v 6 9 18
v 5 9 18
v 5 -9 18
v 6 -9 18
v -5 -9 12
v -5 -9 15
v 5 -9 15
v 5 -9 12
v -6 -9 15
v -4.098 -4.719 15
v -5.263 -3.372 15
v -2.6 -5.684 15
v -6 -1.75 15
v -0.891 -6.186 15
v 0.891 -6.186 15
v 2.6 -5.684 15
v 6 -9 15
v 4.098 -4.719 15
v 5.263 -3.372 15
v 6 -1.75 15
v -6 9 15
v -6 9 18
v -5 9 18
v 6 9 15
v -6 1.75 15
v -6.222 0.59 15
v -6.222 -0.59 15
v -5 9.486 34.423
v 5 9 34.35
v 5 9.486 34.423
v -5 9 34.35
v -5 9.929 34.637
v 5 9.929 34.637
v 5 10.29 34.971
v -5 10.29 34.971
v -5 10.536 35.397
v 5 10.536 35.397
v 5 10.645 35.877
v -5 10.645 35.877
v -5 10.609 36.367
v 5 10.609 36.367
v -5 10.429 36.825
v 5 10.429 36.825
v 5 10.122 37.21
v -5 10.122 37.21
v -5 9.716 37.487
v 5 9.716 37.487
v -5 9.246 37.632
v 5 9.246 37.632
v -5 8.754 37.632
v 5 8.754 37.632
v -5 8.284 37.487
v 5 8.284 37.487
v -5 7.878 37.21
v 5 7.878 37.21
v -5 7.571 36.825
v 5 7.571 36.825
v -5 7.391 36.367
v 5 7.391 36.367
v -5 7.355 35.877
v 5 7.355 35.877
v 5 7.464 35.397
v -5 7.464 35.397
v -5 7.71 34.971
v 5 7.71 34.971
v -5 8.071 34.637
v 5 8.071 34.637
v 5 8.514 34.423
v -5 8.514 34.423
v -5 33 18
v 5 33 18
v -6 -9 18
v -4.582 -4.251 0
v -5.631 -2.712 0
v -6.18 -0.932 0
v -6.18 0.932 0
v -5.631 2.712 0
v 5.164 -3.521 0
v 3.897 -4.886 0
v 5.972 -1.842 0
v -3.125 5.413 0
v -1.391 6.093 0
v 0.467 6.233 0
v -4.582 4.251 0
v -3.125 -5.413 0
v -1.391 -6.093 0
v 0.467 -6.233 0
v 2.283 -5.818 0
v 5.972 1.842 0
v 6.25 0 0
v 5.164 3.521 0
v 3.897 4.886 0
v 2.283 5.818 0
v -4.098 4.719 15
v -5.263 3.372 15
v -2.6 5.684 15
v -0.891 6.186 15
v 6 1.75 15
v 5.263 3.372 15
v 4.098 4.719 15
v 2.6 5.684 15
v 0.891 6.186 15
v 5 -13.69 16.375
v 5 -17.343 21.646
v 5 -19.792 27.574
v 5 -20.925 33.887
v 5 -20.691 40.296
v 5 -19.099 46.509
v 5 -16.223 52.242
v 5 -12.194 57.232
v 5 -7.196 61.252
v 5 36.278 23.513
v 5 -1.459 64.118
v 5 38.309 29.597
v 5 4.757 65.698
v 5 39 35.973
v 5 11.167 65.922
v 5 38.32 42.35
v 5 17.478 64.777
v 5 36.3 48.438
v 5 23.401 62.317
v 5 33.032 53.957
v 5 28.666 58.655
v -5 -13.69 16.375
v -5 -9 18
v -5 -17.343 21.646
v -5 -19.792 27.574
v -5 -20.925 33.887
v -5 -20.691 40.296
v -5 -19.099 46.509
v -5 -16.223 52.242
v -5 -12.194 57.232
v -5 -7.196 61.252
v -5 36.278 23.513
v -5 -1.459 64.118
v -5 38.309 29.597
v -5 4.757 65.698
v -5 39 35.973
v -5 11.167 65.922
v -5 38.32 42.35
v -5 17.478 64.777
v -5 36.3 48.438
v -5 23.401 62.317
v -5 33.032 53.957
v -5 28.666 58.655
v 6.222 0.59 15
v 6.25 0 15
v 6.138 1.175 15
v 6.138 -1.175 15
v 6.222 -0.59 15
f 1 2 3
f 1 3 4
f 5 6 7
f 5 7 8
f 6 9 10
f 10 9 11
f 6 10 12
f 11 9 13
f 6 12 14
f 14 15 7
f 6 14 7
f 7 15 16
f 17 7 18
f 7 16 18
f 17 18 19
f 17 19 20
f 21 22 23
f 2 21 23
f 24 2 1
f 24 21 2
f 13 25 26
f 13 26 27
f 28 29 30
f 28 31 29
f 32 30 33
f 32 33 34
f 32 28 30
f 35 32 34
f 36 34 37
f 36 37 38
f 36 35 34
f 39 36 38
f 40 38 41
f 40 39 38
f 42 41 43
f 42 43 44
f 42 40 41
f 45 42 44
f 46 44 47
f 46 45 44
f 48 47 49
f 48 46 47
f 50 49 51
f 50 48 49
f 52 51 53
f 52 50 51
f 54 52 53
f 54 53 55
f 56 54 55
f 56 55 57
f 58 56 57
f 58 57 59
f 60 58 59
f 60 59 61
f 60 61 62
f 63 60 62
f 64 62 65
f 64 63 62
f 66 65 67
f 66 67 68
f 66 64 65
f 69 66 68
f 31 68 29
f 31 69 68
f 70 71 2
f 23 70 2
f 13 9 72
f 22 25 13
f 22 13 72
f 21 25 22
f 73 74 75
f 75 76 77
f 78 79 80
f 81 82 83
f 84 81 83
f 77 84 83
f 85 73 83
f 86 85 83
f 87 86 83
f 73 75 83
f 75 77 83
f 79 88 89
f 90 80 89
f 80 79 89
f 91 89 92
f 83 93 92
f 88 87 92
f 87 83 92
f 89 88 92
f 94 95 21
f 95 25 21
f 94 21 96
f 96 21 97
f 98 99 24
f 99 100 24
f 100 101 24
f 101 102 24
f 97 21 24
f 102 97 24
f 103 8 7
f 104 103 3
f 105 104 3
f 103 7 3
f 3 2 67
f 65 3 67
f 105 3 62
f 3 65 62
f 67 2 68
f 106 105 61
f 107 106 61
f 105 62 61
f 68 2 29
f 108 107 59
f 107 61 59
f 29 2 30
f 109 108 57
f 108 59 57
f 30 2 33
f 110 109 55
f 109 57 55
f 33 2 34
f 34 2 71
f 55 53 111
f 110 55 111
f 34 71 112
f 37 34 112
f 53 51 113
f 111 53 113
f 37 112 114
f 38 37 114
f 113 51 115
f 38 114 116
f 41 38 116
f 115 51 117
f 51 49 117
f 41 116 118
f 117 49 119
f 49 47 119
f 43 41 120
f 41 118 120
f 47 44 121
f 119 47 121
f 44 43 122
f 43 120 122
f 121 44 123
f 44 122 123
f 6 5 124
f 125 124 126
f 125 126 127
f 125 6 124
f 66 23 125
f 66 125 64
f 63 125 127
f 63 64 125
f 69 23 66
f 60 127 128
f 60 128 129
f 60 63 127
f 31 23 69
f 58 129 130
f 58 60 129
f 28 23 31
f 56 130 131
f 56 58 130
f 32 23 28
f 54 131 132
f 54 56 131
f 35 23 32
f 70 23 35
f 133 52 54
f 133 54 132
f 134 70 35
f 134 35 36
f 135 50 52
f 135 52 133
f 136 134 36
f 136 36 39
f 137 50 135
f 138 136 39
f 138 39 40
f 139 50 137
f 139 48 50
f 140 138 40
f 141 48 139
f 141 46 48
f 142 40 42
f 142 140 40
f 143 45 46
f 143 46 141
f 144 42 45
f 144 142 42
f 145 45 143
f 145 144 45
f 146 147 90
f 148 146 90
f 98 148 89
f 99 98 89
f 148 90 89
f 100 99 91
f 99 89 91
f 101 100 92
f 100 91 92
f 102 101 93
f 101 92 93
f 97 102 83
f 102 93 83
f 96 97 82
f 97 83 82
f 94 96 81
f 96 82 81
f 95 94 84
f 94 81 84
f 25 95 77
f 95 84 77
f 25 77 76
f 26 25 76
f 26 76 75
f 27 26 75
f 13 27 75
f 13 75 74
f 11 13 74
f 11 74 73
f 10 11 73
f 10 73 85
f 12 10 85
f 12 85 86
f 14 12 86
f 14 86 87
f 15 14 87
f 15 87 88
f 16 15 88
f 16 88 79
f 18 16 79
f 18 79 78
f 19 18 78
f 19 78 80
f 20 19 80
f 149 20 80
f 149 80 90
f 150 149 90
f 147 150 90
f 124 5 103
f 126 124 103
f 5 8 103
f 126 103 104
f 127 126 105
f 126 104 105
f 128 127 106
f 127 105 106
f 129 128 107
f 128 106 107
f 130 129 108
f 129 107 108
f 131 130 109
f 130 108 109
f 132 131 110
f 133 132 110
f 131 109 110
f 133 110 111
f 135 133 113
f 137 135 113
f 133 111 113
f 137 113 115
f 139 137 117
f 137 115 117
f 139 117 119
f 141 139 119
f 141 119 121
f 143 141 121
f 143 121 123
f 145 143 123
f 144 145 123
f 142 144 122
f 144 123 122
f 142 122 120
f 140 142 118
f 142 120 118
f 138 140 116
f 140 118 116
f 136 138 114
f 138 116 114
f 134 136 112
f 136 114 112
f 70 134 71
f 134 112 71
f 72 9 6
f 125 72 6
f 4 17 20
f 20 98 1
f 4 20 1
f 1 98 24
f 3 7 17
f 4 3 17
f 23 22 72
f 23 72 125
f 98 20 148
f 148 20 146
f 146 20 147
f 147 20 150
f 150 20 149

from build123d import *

# Parameters (mm, degrees)
SKETCH_2_R      = 6.25
EXTRUDE_1_DEPTH = 15
SKETCH_3_W      = 12
SKETCH_3_H      = 18
EXTRUDE_2_DEPTH = 3
SKETCH_4_R      = 1.65
EXTRUDE_3_DEPTH = 5


with BuildPart() as part:
    # ｽｹｯﾁ2 → ﾎﾞｽ - 押し出し1 (new body)
    with BuildSketch(Plane.XY):
        Circle(SKETCH_2_R)
    extrude(amount=EXTRUDE_1_DEPTH)

    # ｽｹｯﾁ3 → ﾎﾞｽ - 押し出し2 (add)
    with BuildSketch(Plane.XY.offset(15)):
        Rectangle(SKETCH_3_W, SKETCH_3_H)
    extrude(amount=EXTRUDE_2_DEPTH)

    # ｽｹｯﾁ4 → ﾎﾞｽ - 押し出し3 (add, symmetric)
    with BuildSketch(Plane(origin=(0, 0, 0), x_dir=(0, 0, -1), z_dir=(1, 0, 0))):
        with BuildLine():
            Line((-18, 9), (-18, -9))
            Line((-18, -9), (-12, -9))
            ThreePointArc((-12, -9), (-65.69848481, 4.757359313), (-18, 33))
            Line((-18, 33), (-18, 9))
        make_face()
        with Locations((-36, 9)):
            Circle(SKETCH_4_R, mode=Mode.SUBTRACT)
    extrude(amount=EXTRUDE_3_DEPTH, both=True)


solid = part.part
